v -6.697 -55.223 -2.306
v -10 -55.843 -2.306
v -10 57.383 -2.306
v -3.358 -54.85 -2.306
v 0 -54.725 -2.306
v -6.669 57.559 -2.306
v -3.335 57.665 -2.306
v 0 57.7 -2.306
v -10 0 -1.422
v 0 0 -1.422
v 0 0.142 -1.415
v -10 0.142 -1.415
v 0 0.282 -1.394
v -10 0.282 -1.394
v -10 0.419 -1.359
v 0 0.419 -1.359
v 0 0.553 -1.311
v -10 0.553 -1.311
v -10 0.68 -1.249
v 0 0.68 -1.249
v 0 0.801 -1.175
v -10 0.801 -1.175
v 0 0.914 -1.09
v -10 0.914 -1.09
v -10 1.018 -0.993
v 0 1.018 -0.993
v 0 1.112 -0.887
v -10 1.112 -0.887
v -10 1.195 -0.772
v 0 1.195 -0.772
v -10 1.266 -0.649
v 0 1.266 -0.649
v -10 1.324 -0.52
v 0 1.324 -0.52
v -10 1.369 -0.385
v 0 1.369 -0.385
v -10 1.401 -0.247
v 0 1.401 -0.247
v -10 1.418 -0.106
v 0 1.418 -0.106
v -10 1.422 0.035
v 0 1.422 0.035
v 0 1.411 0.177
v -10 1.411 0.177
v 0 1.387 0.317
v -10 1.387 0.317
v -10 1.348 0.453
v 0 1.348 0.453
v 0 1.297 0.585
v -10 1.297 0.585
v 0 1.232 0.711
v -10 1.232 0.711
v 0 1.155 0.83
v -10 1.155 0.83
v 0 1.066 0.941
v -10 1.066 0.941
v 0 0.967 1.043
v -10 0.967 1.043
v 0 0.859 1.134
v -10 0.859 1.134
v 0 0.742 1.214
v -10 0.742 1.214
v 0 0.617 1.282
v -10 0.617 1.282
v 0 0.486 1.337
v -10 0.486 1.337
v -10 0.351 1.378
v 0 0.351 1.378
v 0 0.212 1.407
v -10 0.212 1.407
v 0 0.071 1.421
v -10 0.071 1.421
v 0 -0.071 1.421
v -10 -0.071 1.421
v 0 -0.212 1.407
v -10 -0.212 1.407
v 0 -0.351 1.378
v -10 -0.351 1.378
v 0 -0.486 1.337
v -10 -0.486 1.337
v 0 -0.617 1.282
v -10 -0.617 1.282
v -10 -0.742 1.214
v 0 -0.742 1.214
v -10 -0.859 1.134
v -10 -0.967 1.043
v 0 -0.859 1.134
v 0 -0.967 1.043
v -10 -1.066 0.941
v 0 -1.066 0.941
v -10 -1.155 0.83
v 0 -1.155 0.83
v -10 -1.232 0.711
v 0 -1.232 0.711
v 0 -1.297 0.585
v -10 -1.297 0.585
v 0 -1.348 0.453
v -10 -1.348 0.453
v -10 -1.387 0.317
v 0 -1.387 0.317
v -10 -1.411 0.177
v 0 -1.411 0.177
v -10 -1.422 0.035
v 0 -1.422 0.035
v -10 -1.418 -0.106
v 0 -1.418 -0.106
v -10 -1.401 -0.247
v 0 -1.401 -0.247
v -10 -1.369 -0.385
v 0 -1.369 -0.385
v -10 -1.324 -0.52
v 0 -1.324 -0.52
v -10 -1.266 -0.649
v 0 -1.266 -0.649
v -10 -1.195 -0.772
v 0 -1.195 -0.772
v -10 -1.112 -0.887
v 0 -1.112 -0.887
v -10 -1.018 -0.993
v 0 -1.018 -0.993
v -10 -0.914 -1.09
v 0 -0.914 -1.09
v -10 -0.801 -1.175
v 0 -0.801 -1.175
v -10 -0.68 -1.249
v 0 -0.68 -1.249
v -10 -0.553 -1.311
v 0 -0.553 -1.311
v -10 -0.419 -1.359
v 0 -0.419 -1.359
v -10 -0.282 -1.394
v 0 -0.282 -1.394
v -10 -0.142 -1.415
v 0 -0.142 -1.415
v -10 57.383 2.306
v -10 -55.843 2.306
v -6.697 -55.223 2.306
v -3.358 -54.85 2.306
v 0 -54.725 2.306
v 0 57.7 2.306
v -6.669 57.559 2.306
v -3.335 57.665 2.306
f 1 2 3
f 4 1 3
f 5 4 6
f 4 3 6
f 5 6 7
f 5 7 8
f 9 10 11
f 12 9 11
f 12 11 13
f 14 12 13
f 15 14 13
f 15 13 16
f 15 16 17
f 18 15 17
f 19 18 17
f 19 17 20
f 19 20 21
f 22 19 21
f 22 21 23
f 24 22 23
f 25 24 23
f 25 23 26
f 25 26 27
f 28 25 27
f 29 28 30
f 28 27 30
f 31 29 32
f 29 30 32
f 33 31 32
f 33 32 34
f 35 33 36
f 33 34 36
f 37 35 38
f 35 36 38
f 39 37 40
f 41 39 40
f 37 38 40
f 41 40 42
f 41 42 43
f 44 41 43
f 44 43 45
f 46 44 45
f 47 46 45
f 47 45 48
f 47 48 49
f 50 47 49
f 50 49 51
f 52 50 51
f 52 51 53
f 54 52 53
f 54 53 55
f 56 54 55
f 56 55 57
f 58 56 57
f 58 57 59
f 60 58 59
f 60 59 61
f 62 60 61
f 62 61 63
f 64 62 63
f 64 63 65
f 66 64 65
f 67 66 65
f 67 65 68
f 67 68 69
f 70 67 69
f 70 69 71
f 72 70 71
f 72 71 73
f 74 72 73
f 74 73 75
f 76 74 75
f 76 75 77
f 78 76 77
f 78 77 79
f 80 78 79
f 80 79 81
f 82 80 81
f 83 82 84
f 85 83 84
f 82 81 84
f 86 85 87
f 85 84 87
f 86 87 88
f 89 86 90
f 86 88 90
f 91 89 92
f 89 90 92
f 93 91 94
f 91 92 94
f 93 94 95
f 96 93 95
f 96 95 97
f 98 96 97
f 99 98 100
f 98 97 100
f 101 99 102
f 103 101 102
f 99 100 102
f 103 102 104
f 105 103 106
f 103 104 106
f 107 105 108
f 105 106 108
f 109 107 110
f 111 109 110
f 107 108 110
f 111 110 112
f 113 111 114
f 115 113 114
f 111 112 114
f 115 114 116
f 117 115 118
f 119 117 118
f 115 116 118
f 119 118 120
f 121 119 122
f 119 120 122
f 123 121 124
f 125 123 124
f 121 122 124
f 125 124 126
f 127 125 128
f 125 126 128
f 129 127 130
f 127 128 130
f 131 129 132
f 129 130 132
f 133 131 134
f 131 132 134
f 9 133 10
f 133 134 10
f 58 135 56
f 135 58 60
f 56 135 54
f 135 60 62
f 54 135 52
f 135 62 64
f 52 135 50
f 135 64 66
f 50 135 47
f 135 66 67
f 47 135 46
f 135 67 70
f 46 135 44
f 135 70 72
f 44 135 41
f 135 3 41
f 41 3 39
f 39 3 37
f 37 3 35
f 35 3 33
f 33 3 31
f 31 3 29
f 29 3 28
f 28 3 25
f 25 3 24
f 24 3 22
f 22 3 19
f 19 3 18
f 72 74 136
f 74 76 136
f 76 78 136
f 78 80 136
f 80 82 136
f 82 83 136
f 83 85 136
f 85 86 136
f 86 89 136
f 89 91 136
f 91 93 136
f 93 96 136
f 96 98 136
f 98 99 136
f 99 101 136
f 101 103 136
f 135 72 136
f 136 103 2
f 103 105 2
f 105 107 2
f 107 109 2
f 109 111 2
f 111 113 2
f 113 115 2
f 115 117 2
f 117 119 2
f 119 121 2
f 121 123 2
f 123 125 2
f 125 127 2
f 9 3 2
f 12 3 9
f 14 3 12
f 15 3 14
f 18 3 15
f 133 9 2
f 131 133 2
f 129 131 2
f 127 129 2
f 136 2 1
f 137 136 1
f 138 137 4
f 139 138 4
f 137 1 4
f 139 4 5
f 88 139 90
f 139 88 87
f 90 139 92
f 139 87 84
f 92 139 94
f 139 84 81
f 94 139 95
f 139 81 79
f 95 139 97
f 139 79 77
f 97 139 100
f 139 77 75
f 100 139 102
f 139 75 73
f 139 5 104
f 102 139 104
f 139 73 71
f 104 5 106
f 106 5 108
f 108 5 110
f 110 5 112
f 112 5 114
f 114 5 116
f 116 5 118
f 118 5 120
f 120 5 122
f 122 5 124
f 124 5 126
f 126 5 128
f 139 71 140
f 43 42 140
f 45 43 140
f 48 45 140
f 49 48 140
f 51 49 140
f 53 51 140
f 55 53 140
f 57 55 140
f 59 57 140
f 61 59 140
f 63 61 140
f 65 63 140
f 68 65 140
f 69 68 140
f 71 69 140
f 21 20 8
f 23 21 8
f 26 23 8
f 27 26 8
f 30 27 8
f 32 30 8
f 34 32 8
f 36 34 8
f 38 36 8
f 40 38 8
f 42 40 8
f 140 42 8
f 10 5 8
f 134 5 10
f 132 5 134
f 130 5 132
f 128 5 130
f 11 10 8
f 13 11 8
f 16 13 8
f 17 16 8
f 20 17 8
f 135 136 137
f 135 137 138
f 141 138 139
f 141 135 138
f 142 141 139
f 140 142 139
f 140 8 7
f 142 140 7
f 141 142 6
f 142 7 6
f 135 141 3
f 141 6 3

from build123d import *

# Parameters (mm, degrees)
SKETCH1_W           = 10
SKETCH1_H           = 5
EXTRUDE1_DEPTH      = 2.30625
SKETCH2_R           = 1.4224
EXTRUDE2_DEPTH      = 11
BOSS_EXTRUDE1_DEPTH = 4.6125


with BuildPart() as part:
    # Sketch1 → Extrude1 (new body, symmetric)
    with BuildSketch(Plane.XY):
        with Locations((-5, 0)):
            Rectangle(SKETCH1_W, SKETCH1_H)
    extrude(amount=EXTRUDE1_DEPTH, both=True)

    # Sketch2 → Extrude2 (cut, through all)
    with BuildSketch(Plane(origin=(0, 0, 0), x_dir=(0, 0, -1), z_dir=(1, 0, 0))):
        Circle(SKETCH2_R)
    extrude(amount=-EXTRUDE2_DEPTH, mode=Mode.SUBTRACT)

    # Sketch3 → Boss-Extrude1 (add)
    with BuildSketch(Plane(origin=(0, 0, -2.30625), x_dir=(-1, 0, 0), z_dir=(0, 0, -1))):
        with BuildLine():
            Line((10, 57.382622929), (10, 2.5))
            Line((10, 2.5), (0, 2.5))
            Line((0, 2.5), (0, 57.7))
            ThreePointArc((0, 57.7), (5.002517571, 57.620635762), (10, 57.382622929))
        make_face()
        with BuildLine():
            Line((0, -54.725), (0, -2.5))
            Line((0, -2.5), (10, -2.5))
            Line((10, -2.5), (10, -55.843170121))
            ThreePointArc((10, -55.843170121), (5.031160513, -55.005410893), (0, -54.725))
        make_face()
    extrude(amount=-BOSS_EXTRUDE1_DEPTH)


solid = part.part
